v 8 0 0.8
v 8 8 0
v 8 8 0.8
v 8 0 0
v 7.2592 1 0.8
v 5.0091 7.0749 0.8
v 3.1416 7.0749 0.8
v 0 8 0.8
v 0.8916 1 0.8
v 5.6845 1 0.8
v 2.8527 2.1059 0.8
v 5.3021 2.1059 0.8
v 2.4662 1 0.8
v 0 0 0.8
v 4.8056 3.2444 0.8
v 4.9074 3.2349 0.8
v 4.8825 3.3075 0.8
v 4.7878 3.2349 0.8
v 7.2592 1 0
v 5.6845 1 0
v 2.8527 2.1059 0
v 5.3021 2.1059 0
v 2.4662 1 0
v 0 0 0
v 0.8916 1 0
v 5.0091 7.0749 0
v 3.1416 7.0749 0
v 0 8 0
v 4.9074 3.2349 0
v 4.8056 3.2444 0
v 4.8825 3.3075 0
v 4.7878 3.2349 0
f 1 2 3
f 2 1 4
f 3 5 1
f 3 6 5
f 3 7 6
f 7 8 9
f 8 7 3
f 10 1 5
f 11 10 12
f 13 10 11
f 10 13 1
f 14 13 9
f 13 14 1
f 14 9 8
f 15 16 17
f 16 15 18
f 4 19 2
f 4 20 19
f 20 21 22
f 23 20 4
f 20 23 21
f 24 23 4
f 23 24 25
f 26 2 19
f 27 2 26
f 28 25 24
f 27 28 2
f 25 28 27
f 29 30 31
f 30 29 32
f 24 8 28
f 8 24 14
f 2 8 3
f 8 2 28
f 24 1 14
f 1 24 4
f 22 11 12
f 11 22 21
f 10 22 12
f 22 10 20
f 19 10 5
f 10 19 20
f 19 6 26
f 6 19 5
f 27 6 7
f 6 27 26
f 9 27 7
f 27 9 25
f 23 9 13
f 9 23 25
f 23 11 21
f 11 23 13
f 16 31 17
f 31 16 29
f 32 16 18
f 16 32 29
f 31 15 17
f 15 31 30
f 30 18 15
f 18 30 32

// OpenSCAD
/* Kit Frame parts */

module kit_frame_perimeter(width, height, thickness=1.6) {
  difference() {
    cube([width, height, thickness]);

    translate([thickness, thickness, -1]) cube([width - 2*thickness, height - 2*thickness, thickness + 2]);
  }
}

module name_card(text, width, height, font_size, thickness=1.6) {
  difference() {
    cube([width, height, thickness / 2]);
    translate([width/2, 1, -1]) linear_extrude(thickness + 2) {
      text(text="THEFT OF FIRE", size=font_size-2, font="Roboto Slab:style=Bold", halign="center");
    }
    // O
    translate([28.8, 3, -1]) cylinder(h=thickness + 2, d=3.3, $fn=16);
    // R
    translate([43, 3.8, -1]) cylinder(h=thickness + 2, d=2.2, $fn=16);

  }

  translate([width/2, 7, 0.001]) {
    color("red") linear_extrude(thickness + 0.4) {
      text(text=text, size=font_size, font="Roboto Slab:style=Bold", halign="center");
    }
  }
}

module label(text, thickness=1.6) {
  w = 8;
  h = 8;

  difference() {
    cube([w, h, thickness / 2]);

    translate([w/2, 1, -1]) linear_extrude(thickness + 2) {
      text(text=text, size=6, font="Robot Slab:style=Bold", halign="center");
    }

    if (text == "4") {
      translate([2.7, 2.9, -1]) cube([2, 1.45, thickness + 1]);
      translate([3.6, 4, -1]) cube([1.2, 1.7, thickness + 1]);
    }
    if (text == "A") {
      translate([4, 4.45, -1]) cylinder(h=thickness + 1, d=2.9, $fn=32);
    }
  }
}

module rounded_bend_cap(thickness = 1.6) {
  cylinder(h = thickness, d = thickness, $fn = 16);
}

module wire(length, taper_start, taper_end, thickness=1.6) {
  // Actually one more than this after slicing.
  join_layers = 1;
  join_width = 0.6;

  difference() {
    translate([-0.01, -thickness/2, 0]) cube([length + 0.02, thickness, thickness]);

    if(taper_start) {
      translate([-0.02, 0, join_layers * 0.2]) rotate([0, -45, 0]) translate([0, -thickness/2 - 1, 0]) cube([length, thickness + 2, thickness]);
      translate([-0.02, -join_width/2, 0]) rotate([0, 0, -45]) translate([0, -thickness, -1]) cube([length, thickness, thickness + 2]);
      translate([-0.02, join_width/2, 0]) rotate([0, 0, 45]) translate([0, 0, -1]) cube([length, thickness, thickness + 2]);
    }

    if (taper_end) {
      translate([length + 0.02, 0, join_layers * 0.2]) rotate([0, 45, 0]) translate([-length, -thickness/2 - 1, 0]) cube([length, thickness + 2, thickness]);
      translate([length + 0.02, -join_width/2, 0]) rotate([0, 0, 45]) translate([-length, -thickness, -1]) cube([length, thickness, thickness + 2]);
      translate([length + 0.02, join_width/2, 0]) rotate([0, 0, -45]) translate([-length, 0, -1]) cube([length, thickness, thickness + 2]);
    }
  }
}

module white_cat_card() {
  name_card("WHITE CAT", 55, 15, 6);
}

module kasm_card() {
  name_card("KASM", 30, 10, 6);
}

module white_cat_frame(thickness = 1.6) {
  x = 30 / sqrt(2) + 1.6;

  difference() {
    kit_frame_perimeter(179.8, 178);

    translate([-0.01, -0.01, -1]) cube([x, x, thickness + 2]);
    translate([179.8 - x + 0.01, -0.01, -1]) cube([x, x, thickness + 2]);
  }
  translate([x, thickness/2, 0]) rounded_bend_cap();
  translate([thickness/2, x, 0]) rounded_bend_cap();

  translate([179.8-x, thickness/2, 0]) rounded_bend_cap();
  translate([179.8-thickness/2, x, 0]) rounded_bend_cap();

  translate([179.8-x, thickness/2, 0]) rotate([0, 0, 45]) translate([0, -thickness/2, 0]) cube([30+thickness*sin(45), thickness, thickness]);
  translate([x, thickness/2, 0]) rotate([0, 0, 135]) translate([0, -thickness/2, 0]) cube([30+thickness*sin(45), thickness, thickness]);

  translate([90 - (55/2), 1.6, 0]) white_cat_card();

  //translate([179.8 - x, 1.6, 0]) rotate([0, 0, 45]) kasm_card();
}

module frame_test() {
  kit_frame_perimeter(30, 30);

  translate([40, 0, 0]) rotate([0, 0, 90]) kasm_card();

  translate([4, 4, 0]) cube([10, 10, 1.6]);

  translate([0, 4+5, 0]) wire(4, false, true);
  translate([4+5, 0, 0]) rotate([0, 0, 90]) wire(4, false, true);
}

frame_test();
!label("A");

//white_cat_frame();
